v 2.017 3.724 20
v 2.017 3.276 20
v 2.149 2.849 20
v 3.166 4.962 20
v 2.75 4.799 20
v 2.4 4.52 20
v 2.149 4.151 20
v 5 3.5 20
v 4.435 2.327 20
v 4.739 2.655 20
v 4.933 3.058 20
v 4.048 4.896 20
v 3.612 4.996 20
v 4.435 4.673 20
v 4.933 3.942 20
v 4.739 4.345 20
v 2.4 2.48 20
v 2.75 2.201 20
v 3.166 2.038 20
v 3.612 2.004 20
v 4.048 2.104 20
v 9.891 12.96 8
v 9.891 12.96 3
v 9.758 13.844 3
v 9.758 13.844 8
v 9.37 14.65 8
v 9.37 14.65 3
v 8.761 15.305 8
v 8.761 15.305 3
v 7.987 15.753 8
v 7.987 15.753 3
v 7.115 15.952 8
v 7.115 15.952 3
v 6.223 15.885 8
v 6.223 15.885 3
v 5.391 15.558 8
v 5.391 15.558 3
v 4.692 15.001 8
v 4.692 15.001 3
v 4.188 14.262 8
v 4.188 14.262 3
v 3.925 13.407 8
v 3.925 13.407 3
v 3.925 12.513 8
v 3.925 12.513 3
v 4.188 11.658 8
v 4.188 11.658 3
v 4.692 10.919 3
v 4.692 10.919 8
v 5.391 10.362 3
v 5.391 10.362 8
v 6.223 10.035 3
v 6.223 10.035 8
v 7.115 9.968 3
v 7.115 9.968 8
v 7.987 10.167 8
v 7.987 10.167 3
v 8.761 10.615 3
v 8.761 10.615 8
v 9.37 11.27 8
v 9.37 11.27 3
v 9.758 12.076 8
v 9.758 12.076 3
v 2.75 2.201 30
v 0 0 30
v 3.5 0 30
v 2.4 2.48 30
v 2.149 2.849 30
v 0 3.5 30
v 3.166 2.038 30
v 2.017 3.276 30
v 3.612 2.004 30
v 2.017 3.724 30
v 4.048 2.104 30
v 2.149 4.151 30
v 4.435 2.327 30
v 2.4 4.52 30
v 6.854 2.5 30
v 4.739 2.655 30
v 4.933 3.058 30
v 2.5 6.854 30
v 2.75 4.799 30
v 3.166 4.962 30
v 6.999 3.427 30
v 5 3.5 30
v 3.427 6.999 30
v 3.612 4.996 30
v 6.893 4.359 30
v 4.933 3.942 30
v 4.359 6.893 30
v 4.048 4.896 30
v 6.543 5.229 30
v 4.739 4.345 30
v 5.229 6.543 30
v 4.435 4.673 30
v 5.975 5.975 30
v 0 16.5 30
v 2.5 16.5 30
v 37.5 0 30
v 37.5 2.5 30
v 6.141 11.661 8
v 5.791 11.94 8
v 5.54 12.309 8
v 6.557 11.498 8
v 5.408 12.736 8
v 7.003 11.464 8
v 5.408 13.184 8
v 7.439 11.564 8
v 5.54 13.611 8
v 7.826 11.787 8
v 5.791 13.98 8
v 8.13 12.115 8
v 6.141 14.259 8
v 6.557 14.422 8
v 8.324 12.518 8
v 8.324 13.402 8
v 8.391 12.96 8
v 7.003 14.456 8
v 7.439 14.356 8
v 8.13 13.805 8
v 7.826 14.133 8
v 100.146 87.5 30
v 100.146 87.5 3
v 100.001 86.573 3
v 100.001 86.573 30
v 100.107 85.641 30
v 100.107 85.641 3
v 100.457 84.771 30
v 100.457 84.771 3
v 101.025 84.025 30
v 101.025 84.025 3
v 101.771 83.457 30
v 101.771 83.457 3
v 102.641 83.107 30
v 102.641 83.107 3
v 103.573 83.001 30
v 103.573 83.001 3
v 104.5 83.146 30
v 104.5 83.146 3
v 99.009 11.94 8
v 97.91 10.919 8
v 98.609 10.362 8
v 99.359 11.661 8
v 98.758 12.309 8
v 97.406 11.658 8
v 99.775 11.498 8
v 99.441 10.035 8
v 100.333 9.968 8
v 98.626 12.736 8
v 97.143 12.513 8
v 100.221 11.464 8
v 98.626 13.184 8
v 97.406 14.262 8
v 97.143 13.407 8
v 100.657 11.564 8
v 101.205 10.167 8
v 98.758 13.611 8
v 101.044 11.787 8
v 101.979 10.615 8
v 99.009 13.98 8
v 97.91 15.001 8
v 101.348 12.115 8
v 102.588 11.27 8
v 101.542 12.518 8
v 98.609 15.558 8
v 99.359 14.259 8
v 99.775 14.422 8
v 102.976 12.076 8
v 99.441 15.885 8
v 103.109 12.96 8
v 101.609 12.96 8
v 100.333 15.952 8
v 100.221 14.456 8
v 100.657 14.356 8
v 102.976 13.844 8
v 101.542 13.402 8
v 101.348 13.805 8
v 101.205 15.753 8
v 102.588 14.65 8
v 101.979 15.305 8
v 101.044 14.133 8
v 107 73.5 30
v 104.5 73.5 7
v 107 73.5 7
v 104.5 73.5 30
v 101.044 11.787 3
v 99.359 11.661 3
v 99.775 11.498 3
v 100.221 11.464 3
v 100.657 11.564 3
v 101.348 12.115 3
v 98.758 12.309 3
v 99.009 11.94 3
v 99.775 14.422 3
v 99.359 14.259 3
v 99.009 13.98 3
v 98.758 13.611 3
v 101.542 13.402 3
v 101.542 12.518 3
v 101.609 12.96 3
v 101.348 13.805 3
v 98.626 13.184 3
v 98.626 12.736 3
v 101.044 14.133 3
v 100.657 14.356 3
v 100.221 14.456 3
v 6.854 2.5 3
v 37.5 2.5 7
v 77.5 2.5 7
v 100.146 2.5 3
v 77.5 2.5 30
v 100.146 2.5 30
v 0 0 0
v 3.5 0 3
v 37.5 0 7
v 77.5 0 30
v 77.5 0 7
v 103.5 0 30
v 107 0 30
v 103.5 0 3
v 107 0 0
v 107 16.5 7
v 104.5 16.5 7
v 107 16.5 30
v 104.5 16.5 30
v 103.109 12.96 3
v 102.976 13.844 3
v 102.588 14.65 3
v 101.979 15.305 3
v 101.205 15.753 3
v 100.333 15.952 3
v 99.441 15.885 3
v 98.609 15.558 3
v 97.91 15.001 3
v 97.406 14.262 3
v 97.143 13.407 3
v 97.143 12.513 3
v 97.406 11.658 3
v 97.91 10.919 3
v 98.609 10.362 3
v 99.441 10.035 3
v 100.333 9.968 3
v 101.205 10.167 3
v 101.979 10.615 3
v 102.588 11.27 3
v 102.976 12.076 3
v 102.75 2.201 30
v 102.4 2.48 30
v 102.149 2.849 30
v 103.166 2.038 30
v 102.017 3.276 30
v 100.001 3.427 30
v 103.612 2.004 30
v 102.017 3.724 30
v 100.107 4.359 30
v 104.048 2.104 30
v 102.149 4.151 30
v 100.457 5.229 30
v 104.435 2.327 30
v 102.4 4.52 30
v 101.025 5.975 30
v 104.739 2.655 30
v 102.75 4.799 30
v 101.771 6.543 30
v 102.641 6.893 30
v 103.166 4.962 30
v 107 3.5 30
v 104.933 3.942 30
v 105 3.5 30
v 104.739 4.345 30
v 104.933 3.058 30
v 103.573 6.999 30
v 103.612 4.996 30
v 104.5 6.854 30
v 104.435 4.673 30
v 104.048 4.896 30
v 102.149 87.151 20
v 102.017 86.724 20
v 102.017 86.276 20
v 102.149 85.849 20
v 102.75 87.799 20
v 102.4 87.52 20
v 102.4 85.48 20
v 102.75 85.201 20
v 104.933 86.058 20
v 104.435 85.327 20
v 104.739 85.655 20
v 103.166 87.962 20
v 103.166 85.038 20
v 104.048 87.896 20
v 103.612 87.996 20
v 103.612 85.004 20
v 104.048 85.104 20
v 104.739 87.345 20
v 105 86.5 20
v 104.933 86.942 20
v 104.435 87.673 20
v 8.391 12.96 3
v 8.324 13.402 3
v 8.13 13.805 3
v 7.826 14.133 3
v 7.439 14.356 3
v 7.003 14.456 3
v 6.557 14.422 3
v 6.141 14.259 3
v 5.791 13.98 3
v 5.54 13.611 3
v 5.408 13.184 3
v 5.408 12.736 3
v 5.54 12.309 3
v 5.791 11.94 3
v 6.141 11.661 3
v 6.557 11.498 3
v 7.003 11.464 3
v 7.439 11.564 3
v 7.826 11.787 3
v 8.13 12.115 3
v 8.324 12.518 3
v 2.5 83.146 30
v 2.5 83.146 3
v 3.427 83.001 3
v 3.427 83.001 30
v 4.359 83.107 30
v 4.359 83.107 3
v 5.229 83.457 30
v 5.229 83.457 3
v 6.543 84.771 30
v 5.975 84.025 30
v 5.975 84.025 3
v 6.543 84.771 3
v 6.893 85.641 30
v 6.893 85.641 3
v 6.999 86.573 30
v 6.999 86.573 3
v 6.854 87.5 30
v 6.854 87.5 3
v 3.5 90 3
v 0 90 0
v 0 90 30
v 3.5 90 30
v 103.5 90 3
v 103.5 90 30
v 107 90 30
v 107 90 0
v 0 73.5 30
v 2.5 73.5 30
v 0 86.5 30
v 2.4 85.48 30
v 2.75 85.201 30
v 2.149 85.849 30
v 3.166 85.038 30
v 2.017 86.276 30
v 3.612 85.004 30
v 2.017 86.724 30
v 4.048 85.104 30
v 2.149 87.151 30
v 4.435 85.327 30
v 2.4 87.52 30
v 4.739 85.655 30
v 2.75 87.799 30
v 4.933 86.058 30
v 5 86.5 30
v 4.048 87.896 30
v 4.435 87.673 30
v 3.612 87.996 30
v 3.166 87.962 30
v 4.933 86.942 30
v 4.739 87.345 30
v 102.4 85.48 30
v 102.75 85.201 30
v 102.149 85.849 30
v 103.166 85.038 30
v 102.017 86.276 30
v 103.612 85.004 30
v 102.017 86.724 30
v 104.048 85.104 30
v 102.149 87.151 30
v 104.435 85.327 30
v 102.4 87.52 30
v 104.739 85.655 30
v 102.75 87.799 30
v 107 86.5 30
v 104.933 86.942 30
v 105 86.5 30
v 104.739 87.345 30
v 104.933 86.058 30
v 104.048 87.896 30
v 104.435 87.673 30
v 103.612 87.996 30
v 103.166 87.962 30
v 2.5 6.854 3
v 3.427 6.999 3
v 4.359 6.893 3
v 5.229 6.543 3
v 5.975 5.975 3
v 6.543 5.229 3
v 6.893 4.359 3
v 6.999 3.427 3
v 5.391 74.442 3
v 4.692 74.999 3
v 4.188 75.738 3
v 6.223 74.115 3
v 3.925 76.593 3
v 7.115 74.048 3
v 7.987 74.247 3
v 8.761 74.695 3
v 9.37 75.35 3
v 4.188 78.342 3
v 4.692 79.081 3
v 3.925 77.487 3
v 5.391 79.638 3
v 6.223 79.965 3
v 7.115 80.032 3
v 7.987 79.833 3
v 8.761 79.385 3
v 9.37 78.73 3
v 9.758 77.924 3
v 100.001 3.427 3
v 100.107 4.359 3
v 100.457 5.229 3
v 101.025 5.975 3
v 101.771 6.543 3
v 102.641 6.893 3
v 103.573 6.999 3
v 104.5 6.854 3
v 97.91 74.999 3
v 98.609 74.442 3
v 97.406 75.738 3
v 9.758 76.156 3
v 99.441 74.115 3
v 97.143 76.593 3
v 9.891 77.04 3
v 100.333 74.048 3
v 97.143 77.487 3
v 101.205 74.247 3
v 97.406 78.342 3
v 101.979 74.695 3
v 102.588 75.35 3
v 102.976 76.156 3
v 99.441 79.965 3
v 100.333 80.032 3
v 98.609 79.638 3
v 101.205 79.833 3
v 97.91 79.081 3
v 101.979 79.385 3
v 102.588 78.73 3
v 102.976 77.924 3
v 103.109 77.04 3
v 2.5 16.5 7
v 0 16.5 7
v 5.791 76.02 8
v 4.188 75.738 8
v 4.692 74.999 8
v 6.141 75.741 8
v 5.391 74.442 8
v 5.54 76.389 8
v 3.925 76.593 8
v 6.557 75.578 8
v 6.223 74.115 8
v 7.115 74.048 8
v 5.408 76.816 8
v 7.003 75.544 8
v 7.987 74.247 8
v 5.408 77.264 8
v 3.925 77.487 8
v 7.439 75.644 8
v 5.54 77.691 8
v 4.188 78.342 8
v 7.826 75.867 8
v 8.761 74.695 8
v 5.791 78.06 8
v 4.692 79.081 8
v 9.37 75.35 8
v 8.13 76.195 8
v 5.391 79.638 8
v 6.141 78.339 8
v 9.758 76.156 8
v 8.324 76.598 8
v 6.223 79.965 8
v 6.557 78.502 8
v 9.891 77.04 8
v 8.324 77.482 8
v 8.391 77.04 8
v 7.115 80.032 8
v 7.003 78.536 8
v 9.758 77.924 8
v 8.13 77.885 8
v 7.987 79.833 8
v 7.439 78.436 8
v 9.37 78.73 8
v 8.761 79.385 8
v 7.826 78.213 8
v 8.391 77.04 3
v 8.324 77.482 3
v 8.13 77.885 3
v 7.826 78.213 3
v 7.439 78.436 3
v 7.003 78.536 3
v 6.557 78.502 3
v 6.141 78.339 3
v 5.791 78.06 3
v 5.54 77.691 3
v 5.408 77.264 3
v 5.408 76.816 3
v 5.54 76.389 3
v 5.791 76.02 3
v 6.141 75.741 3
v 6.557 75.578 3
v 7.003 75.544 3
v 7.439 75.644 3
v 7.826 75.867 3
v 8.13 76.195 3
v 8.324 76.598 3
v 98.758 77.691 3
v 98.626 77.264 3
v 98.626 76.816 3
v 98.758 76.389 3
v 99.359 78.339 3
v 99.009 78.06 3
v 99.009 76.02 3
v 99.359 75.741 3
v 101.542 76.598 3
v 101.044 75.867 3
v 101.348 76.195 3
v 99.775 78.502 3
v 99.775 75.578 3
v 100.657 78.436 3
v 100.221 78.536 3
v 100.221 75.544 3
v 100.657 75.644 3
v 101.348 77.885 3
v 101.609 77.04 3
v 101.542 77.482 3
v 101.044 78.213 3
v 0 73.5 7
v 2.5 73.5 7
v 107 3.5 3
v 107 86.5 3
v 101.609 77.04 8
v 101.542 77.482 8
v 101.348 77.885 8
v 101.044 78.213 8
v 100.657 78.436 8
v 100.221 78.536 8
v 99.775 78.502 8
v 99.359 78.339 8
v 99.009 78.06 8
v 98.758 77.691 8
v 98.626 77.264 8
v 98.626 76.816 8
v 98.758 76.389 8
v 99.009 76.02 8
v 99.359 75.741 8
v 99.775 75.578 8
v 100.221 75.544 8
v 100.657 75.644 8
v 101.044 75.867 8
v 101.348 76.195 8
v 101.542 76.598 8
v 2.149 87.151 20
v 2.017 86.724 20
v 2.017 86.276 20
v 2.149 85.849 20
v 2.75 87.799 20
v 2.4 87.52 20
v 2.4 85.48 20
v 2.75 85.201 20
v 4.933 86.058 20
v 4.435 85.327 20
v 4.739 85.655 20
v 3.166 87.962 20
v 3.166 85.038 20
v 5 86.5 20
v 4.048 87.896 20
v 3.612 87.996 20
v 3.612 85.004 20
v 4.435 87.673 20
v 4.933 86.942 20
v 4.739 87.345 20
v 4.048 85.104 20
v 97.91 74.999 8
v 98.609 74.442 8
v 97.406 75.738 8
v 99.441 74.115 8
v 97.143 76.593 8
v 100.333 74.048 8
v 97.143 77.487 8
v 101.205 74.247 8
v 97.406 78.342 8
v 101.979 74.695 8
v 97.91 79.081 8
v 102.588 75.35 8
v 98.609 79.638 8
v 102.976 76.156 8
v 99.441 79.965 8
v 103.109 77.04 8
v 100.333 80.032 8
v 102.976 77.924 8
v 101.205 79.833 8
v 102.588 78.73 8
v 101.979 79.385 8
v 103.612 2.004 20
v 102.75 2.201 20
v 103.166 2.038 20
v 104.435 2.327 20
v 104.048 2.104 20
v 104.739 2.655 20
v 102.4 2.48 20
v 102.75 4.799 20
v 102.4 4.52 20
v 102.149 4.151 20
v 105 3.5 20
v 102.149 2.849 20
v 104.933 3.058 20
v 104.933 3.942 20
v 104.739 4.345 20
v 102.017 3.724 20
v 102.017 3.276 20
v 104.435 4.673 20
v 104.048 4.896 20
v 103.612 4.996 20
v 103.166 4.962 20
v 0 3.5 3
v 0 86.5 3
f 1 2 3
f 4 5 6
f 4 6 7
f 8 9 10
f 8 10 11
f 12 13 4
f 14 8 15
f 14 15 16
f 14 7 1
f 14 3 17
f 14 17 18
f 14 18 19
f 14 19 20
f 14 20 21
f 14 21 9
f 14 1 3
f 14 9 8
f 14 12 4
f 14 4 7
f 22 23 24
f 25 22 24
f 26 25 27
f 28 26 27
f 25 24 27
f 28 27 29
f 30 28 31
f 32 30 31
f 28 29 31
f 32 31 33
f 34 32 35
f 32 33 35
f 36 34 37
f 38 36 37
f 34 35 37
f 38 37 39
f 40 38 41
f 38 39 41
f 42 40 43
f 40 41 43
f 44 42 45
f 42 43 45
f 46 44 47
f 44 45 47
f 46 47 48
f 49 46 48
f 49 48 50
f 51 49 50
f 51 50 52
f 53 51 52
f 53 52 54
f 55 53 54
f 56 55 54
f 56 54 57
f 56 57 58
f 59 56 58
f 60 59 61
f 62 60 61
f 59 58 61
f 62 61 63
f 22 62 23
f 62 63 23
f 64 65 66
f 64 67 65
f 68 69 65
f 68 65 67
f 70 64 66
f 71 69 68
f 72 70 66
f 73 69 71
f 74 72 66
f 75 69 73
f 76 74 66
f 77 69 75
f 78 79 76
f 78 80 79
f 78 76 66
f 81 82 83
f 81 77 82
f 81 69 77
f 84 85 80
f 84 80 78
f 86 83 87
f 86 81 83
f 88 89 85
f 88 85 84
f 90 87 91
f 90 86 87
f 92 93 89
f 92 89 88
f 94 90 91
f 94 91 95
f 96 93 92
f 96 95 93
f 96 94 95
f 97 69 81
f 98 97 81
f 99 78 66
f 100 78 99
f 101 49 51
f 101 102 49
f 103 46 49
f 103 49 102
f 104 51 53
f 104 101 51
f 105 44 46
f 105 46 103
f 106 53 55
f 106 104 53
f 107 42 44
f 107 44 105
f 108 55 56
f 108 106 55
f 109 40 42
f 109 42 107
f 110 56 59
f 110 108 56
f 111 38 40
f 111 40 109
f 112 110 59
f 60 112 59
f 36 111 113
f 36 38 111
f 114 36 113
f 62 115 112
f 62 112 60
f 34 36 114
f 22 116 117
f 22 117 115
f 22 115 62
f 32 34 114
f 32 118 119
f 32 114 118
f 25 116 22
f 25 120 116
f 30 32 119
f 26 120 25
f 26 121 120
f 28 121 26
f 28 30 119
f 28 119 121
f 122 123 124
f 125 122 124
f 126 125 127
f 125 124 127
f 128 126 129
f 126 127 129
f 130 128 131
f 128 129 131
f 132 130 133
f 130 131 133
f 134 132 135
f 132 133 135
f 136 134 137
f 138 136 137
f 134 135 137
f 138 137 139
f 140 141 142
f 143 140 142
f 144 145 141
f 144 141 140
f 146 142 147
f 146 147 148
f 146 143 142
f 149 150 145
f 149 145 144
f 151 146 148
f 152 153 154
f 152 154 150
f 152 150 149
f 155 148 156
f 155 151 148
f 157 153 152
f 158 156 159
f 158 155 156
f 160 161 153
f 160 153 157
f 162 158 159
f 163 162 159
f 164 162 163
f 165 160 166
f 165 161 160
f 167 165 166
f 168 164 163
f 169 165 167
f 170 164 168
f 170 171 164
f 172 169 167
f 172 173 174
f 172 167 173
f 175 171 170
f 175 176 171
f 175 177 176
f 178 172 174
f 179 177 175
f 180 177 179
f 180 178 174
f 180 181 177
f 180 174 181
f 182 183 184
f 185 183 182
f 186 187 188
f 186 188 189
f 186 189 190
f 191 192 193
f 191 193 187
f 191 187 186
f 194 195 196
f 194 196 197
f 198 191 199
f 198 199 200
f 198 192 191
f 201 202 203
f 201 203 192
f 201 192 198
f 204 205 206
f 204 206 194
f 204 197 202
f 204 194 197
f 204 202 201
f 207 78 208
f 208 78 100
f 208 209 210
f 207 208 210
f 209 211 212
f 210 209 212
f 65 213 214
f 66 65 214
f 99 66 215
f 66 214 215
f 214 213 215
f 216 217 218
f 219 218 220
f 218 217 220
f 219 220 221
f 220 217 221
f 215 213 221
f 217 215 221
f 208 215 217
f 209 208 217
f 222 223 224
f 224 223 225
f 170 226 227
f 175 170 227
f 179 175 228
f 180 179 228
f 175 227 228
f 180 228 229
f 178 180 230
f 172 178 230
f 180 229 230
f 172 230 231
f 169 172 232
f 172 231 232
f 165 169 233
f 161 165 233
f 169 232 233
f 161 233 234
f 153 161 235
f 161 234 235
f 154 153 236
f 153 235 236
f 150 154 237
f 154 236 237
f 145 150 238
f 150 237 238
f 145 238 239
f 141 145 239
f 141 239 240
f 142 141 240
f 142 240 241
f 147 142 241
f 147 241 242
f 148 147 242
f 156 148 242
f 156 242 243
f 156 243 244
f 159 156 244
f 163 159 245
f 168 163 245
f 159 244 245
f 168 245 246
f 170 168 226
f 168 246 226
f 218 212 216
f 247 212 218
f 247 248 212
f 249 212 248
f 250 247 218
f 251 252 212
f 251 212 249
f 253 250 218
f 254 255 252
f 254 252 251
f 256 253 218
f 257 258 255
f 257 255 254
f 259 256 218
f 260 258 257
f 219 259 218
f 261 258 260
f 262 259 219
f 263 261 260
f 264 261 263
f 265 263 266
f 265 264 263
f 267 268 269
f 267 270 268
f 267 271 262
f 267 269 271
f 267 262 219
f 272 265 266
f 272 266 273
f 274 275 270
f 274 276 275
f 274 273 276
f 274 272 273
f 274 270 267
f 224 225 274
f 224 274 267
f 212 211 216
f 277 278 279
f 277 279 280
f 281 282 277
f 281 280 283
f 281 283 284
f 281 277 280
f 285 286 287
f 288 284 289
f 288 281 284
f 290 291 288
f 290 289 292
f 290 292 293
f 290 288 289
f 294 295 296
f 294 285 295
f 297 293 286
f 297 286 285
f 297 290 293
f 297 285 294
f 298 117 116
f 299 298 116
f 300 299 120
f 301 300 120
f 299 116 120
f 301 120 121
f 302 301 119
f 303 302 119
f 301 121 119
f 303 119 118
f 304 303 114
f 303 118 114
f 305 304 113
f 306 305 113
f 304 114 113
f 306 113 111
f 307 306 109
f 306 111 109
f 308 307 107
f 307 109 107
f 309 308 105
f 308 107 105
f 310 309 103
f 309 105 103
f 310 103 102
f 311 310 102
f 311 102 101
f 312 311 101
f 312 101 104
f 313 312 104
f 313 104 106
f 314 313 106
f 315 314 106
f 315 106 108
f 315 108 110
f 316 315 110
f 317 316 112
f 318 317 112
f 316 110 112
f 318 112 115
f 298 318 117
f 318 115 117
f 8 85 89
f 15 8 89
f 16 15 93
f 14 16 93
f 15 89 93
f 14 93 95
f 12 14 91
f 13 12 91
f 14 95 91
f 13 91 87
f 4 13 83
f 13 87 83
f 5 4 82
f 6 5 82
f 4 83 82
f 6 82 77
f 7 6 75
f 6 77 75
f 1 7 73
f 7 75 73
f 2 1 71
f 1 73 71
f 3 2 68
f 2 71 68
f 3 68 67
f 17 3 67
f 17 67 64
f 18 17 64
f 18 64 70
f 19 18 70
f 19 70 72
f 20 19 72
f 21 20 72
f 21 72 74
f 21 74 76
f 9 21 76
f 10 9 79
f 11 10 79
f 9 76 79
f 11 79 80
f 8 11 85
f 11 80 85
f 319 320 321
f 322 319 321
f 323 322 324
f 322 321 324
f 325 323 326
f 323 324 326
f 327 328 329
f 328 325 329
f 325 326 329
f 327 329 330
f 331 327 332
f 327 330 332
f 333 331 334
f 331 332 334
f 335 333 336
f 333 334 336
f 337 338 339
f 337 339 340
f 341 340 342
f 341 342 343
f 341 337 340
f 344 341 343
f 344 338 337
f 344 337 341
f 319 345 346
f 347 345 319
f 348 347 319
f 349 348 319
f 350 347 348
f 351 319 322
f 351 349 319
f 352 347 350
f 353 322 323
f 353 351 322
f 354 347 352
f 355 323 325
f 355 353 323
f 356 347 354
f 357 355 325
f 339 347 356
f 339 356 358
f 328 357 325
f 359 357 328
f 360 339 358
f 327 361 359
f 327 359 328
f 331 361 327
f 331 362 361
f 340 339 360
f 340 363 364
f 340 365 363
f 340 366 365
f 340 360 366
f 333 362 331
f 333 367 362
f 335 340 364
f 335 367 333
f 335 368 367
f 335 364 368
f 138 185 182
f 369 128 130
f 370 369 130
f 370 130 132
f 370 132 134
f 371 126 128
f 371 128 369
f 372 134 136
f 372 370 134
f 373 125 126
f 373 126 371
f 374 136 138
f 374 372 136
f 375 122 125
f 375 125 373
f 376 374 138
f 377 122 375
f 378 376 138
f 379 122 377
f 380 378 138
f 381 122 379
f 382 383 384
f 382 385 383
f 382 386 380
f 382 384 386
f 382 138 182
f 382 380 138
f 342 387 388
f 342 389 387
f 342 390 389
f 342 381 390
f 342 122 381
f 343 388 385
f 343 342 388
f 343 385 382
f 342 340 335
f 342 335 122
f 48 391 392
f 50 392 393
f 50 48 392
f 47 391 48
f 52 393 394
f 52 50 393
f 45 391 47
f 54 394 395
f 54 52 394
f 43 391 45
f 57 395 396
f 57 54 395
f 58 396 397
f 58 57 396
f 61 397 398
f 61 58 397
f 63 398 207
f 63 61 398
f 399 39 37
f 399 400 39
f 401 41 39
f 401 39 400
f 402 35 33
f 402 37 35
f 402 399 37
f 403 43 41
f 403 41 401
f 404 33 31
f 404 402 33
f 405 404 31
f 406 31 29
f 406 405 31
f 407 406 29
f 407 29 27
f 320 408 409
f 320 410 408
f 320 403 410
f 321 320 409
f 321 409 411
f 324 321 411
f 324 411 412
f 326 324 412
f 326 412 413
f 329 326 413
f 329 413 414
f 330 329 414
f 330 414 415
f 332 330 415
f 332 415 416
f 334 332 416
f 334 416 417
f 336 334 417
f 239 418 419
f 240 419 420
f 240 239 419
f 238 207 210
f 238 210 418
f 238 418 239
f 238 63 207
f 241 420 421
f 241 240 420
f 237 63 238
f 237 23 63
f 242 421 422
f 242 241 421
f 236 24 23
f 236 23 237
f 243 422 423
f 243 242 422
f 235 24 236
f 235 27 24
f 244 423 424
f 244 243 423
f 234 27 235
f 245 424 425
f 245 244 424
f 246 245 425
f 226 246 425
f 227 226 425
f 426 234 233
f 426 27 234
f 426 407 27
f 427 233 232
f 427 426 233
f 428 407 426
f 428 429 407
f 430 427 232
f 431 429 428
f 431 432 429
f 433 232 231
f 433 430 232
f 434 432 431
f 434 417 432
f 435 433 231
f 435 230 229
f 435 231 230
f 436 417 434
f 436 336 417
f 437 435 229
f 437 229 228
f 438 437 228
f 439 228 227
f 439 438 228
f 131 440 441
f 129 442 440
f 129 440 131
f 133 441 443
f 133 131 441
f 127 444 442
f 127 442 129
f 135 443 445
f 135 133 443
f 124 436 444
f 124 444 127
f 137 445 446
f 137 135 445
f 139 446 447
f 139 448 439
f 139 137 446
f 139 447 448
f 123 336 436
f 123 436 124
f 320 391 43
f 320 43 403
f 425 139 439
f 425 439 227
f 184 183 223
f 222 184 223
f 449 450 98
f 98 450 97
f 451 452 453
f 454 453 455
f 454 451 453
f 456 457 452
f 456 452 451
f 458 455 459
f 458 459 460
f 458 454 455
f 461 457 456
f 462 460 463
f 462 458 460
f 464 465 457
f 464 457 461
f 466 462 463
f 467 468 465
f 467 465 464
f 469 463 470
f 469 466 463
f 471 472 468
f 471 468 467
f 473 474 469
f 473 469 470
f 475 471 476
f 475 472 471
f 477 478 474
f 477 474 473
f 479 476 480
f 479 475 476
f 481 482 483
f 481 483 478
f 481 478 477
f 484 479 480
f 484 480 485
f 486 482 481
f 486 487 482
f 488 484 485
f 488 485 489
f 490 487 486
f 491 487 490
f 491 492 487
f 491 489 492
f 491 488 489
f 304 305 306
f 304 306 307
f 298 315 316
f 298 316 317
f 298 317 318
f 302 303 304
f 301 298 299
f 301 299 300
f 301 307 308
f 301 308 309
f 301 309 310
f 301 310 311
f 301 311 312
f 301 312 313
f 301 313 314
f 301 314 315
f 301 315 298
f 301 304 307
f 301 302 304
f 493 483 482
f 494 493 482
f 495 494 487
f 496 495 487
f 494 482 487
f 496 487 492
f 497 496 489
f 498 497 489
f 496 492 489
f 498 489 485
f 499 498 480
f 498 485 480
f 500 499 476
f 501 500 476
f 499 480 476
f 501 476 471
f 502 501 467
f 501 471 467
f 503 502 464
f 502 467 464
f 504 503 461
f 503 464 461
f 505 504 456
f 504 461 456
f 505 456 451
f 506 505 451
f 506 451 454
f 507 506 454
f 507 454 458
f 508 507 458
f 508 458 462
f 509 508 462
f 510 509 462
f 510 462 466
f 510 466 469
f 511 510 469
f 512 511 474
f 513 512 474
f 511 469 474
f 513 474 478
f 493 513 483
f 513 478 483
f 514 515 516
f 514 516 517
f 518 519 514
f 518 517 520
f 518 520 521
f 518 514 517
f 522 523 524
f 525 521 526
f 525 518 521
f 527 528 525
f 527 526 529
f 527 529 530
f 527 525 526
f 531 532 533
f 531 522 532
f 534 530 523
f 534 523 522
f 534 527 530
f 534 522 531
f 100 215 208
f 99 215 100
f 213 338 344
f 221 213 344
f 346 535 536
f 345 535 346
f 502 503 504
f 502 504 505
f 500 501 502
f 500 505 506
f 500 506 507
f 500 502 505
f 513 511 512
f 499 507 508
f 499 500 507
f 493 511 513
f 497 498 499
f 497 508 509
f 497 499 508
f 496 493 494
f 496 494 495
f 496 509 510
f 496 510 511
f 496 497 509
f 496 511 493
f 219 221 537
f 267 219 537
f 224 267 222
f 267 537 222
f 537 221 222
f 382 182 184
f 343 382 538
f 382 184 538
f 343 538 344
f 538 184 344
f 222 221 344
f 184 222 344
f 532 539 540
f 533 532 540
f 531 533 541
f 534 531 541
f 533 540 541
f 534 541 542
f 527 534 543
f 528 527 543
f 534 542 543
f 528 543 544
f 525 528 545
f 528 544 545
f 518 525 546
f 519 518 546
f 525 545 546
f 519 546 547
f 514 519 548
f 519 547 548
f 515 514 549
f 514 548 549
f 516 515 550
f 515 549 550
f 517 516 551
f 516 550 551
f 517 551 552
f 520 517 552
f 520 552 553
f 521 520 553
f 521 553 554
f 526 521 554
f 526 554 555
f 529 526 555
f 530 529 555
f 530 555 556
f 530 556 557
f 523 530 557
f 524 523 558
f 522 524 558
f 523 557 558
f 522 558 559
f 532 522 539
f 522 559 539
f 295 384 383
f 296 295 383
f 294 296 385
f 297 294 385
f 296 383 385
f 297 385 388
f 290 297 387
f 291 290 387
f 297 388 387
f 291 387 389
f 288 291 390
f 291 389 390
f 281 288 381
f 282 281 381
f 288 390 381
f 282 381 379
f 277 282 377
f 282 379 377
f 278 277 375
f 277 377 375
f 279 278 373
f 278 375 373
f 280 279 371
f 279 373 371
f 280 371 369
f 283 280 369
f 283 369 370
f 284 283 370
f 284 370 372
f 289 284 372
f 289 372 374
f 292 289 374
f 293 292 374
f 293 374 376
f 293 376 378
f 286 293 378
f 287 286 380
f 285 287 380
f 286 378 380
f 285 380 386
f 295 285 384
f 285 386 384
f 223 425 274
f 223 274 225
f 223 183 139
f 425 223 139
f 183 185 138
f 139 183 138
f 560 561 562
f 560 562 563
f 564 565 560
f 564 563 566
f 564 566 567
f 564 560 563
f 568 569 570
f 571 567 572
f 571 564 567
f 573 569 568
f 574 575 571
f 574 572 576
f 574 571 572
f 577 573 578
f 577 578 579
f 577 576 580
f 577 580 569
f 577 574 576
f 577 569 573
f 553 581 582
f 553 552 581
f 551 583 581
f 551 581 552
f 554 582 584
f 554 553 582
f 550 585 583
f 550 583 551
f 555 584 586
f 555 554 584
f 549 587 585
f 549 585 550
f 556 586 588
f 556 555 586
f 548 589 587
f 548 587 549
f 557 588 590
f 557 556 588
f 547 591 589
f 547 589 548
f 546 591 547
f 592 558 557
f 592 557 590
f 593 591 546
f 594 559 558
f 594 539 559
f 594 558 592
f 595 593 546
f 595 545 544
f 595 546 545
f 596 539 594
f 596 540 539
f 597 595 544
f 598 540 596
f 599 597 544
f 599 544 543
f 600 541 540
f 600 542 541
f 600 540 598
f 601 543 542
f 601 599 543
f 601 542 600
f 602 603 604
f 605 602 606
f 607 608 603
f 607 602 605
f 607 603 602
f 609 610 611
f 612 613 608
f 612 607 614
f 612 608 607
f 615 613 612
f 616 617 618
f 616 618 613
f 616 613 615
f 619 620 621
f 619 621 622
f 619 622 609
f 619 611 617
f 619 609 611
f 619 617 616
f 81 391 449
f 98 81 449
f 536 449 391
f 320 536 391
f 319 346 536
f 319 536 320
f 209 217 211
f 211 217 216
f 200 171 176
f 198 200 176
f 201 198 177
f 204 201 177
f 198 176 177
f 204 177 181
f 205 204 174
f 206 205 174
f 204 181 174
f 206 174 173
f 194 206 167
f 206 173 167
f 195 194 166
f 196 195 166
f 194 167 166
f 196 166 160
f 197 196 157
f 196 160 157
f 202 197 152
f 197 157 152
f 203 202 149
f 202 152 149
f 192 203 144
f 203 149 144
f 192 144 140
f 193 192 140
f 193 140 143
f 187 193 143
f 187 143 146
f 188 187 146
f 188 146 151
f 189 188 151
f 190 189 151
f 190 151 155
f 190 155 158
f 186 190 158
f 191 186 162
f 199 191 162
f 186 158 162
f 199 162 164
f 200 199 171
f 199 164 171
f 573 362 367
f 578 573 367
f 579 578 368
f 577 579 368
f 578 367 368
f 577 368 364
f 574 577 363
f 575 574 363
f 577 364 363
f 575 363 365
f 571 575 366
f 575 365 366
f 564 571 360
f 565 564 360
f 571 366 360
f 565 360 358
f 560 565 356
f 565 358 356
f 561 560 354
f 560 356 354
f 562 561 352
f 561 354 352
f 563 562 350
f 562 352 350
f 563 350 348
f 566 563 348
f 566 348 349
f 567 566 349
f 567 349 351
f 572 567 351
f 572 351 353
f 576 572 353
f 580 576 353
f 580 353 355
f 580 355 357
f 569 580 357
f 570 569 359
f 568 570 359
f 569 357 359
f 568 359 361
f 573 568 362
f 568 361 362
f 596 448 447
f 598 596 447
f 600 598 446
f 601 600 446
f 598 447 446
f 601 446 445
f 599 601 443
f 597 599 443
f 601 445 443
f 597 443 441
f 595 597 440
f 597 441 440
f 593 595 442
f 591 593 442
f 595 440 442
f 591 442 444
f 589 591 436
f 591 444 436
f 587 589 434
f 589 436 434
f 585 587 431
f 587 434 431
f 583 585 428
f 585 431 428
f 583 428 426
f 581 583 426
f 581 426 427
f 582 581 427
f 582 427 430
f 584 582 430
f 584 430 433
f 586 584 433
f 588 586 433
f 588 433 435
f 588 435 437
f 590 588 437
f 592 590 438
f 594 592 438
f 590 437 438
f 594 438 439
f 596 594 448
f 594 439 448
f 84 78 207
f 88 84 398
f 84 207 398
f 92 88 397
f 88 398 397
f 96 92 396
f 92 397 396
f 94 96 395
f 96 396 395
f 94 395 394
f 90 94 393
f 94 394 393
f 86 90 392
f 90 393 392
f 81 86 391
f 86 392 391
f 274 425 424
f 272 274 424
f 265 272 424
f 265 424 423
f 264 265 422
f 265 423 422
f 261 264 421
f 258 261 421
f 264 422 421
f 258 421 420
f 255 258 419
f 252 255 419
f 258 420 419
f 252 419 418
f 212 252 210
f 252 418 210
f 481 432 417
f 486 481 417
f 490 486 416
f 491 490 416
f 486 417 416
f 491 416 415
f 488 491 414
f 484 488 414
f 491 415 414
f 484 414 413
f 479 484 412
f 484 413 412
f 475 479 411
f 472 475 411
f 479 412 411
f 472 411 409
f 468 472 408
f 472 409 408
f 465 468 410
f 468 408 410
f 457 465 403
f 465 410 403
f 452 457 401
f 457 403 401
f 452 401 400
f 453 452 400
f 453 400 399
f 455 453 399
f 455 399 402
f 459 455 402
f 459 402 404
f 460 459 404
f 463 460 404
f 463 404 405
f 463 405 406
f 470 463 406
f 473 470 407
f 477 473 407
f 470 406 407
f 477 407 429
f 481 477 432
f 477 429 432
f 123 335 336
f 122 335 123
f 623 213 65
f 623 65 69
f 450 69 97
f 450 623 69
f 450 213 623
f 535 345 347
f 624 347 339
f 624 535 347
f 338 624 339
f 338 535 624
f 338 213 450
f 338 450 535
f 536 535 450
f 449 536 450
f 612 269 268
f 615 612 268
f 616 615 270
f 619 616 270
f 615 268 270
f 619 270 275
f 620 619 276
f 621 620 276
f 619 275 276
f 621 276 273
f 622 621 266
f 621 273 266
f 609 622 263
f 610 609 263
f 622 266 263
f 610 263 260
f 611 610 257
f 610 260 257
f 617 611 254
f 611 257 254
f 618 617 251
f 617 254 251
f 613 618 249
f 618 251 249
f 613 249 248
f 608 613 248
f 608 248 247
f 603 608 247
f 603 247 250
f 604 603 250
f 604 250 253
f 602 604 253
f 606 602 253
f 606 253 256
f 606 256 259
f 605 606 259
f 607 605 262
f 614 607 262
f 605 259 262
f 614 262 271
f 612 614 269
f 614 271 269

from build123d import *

# Parameters (mm, degrees)
SKETCH_W        = 107
SKETCH_H        = 90
PAD_DEPTH       = 30
SKETCH001_W     = 102
SKETCH001_H     = 85
POCKET_DEPTH    = 27
SKETCH002_R     = 3.5
PAD001_DEPTH    = 27
SKETCH003_R     = 3
PAD002_DEPTH    = 5
SKETCH004_R     = 1.5
POCKET001_DEPTH = 5
SKETCH007_R     = 1.5
POCKET003_DEPTH = 10
SKETCH014_W     = 57
SKETCH014_H     = 23
POCKET010_DEPTH = 107.001
SKETCH015_W     = 40
SKETCH015_H     = 23
POCKET011_DEPTH = 2.5


with BuildPart() as part:
    # Sketch → Pad (new body)
    with BuildSketch(Plane.XY):
        with Locations((53.5, 45)):
            Rectangle(SKETCH_W, SKETCH_H)
    extrude(amount=PAD_DEPTH)

    # Sketch001 (on Face6 of Pad) → Pocket (cut)
    with BuildSketch(Plane.XY.offset(30)):
        with Locations((53.5, 45)):
            Rectangle(SKETCH001_W, SKETCH001_H)
    extrude(amount=-POCKET_DEPTH, mode=Mode.SUBTRACT)

    # Sketch002 (on Face11 of Pocket) → Pad001 (join)
    with BuildSketch(Plane.XY.offset(3)):
        with Locations((3.5, 86.5)):
            Circle(SKETCH002_R)
        with Locations((3.5, 3.5)):
            Circle(SKETCH002_R)
        with Locations((103.5, 86.5)):
            Circle(SKETCH002_R)
        with Locations((103.5, 3.5)):
            Circle(SKETCH002_R)
    extrude(amount=PAD001_DEPTH)

    # Sketch003 (on Face23 of Pad001) → Pad002 (join)
    with BuildSketch(Plane.XY.offset(3)):
        with Locations((6.891, 77.04)):
            Circle(SKETCH003_R)
        with Locations((6.891, 12.96)):
            Circle(SKETCH003_R)
        with Locations((100.109, 77.04)):
            Circle(SKETCH003_R)
        with Locations((100.109, 12.96)):
            Circle(SKETCH003_R)
    extrude(amount=PAD002_DEPTH)

    # Sketch004 (on Face39 of Pad002) → Pocket001 (cut)
    with BuildSketch(Plane.XY.offset(8)):
        with Locations((6.891, 77.04)):
            Circle(SKETCH004_R)
        with Locations((100.109, 77.04)):
            Circle(SKETCH004_R)
        with Locations((100.109, 12.96)):
            Circle(SKETCH004_R)
        with Locations((6.891, 12.96)):
            Circle(SKETCH004_R)
    extrude(amount=-POCKET001_DEPTH, mode=Mode.SUBTRACT)

    # Sketch007 (on Face17 of Pad001) → Pocket003 (cut)
    with BuildSketch(Plane.XY.offset(30)):
        with Locations((3.5, 86.5)):
            Circle(SKETCH007_R)
        with Locations((103.5, 86.5)):
            Circle(SKETCH007_R)
        with Locations((103.5, 3.5)):
            Circle(SKETCH007_R)
        with Locations((3.5, 3.5)):
            Circle(SKETCH007_R)
    extrude(amount=-POCKET003_DEPTH, mode=Mode.SUBTRACT)

    # Sketch014 → Pocket010 (cut, through all)
    with BuildSketch(Plane(origin=(0, 0, 0), x_dir=(0, -1, 0), z_dir=(-1, 0, 0))):
        with Locations((-45, 18.5)):
            Rectangle(SKETCH014_W, SKETCH014_H)
    extrude(amount=-POCKET010_DEPTH, mode=Mode.SUBTRACT)

    # Sketch015 (on Face1 of Pocket010) → Pocket011 (cut)
    with BuildSketch(Plane.XZ):
        with Locations((57.5, 18.5)):
            Rectangle(SKETCH015_W, SKETCH015_H)
    extrude(amount=-POCKET011_DEPTH, mode=Mode.SUBTRACT)


solid = part.part
